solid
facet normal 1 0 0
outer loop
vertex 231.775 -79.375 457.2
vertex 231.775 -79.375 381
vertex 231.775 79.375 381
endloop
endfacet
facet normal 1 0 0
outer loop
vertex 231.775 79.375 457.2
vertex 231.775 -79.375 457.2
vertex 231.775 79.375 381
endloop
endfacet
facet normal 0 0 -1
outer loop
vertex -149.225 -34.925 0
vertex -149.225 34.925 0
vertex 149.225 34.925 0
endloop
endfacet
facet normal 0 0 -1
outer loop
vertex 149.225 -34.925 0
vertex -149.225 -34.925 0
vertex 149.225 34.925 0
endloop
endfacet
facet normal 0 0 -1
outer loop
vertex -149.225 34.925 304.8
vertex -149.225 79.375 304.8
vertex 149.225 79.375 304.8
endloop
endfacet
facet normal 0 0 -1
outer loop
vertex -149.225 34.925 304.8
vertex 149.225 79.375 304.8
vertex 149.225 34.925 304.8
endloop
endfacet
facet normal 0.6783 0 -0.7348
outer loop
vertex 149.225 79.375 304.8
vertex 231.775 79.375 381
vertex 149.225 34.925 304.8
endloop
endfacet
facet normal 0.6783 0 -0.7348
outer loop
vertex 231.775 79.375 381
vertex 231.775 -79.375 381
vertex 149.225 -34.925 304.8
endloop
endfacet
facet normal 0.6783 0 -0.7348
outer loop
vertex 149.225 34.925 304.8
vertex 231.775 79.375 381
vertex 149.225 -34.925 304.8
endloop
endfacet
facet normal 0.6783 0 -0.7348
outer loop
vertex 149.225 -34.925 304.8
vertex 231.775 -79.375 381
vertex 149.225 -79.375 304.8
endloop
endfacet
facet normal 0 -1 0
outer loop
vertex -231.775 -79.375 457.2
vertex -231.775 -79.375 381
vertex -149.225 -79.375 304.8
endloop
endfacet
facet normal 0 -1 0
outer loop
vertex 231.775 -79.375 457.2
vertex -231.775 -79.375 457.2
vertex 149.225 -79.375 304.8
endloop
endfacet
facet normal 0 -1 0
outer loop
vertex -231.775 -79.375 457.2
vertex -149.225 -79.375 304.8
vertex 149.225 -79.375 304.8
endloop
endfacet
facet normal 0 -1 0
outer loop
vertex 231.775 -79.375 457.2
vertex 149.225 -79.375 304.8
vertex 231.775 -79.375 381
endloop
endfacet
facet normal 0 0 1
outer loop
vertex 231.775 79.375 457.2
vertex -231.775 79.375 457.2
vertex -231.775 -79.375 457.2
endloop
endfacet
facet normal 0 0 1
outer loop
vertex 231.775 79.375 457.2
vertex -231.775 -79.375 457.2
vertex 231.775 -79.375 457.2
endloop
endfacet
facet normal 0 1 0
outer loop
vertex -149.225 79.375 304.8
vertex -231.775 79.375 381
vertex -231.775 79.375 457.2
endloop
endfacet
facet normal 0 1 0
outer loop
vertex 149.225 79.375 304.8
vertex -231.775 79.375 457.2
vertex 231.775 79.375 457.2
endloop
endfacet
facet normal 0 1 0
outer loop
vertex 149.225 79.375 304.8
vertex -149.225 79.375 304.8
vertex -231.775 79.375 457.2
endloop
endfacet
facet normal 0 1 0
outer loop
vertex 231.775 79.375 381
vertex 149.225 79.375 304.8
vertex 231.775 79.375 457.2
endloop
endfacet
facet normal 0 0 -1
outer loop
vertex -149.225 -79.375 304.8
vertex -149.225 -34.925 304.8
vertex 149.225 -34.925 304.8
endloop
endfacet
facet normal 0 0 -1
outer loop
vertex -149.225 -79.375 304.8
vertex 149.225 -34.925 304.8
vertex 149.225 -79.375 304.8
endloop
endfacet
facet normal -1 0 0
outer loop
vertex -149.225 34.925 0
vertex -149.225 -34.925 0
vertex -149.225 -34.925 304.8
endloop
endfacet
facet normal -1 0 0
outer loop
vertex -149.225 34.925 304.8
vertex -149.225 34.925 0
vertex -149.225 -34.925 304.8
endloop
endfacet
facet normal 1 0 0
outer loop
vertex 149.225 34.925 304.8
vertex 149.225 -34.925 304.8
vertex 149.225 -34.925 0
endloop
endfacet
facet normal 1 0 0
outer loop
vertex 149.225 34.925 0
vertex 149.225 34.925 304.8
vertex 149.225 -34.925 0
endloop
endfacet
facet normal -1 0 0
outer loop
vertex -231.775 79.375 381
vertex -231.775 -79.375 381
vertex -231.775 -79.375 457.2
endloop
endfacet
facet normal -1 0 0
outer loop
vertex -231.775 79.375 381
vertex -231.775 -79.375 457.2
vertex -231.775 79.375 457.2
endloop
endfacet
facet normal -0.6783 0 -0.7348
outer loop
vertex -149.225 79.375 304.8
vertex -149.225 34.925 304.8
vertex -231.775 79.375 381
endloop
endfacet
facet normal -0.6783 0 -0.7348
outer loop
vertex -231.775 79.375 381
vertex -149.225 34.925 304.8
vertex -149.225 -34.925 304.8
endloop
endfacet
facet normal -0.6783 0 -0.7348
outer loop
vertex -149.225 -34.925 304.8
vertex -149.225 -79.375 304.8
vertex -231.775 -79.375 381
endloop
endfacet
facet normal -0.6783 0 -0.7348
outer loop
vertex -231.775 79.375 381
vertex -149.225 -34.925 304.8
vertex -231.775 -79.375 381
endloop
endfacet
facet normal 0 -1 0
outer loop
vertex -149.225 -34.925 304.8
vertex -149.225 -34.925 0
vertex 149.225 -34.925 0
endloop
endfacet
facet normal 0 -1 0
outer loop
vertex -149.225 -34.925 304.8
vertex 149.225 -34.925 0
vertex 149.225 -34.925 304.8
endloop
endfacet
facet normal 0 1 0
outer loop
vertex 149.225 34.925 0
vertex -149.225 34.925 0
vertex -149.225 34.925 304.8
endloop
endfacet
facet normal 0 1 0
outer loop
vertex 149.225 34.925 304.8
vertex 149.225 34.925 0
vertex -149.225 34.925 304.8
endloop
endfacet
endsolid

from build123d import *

# Parameters (mm, degrees)
F0_W     = 463.55
F0_H     = 158.75
F1_DEPTH = 457.2
F3_DEPTH = 158.751
F4_W     = 44.45
F4_H     = 304.8
F5_DEPTH = 381.001


with BuildPart() as f1:
    # F0 (on Top) → F1 (new body)
    with BuildSketch(Plane.XY):
        Rectangle(F0_W, F0_H)
    extrude(amount=F1_DEPTH)

    # F2 (on face) → F3 (cut, through all)
    with BuildSketch(Plane.XZ.offset(79.375)):
        Polygon((-149.225, 0), (-149.225, 304.8), (-231.775, 381), (-231.775, 0), align=None)
        Polygon((149.225, 304.8), (149.225, 0), (231.775, 0), (231.775, 381), align=None)
    extrude(amount=-F3_DEPTH, mode=Mode.SUBTRACT)

    # F4 (on face) → F5 (cut, through all)
    with BuildSketch(Plane(origin=(-149.225, 0, 0), x_dir=(0, -1, 0), z_dir=(-1, 0, 0))):
        with Locations((-57.15, 152.4)):
            Rectangle(F4_W, F4_H)
        with Locations((57.15, 152.4)):
            Rectangle(F4_W, F4_H)
    extrude(amount=-F5_DEPTH, mode=Mode.SUBTRACT)


solid = f1.part
